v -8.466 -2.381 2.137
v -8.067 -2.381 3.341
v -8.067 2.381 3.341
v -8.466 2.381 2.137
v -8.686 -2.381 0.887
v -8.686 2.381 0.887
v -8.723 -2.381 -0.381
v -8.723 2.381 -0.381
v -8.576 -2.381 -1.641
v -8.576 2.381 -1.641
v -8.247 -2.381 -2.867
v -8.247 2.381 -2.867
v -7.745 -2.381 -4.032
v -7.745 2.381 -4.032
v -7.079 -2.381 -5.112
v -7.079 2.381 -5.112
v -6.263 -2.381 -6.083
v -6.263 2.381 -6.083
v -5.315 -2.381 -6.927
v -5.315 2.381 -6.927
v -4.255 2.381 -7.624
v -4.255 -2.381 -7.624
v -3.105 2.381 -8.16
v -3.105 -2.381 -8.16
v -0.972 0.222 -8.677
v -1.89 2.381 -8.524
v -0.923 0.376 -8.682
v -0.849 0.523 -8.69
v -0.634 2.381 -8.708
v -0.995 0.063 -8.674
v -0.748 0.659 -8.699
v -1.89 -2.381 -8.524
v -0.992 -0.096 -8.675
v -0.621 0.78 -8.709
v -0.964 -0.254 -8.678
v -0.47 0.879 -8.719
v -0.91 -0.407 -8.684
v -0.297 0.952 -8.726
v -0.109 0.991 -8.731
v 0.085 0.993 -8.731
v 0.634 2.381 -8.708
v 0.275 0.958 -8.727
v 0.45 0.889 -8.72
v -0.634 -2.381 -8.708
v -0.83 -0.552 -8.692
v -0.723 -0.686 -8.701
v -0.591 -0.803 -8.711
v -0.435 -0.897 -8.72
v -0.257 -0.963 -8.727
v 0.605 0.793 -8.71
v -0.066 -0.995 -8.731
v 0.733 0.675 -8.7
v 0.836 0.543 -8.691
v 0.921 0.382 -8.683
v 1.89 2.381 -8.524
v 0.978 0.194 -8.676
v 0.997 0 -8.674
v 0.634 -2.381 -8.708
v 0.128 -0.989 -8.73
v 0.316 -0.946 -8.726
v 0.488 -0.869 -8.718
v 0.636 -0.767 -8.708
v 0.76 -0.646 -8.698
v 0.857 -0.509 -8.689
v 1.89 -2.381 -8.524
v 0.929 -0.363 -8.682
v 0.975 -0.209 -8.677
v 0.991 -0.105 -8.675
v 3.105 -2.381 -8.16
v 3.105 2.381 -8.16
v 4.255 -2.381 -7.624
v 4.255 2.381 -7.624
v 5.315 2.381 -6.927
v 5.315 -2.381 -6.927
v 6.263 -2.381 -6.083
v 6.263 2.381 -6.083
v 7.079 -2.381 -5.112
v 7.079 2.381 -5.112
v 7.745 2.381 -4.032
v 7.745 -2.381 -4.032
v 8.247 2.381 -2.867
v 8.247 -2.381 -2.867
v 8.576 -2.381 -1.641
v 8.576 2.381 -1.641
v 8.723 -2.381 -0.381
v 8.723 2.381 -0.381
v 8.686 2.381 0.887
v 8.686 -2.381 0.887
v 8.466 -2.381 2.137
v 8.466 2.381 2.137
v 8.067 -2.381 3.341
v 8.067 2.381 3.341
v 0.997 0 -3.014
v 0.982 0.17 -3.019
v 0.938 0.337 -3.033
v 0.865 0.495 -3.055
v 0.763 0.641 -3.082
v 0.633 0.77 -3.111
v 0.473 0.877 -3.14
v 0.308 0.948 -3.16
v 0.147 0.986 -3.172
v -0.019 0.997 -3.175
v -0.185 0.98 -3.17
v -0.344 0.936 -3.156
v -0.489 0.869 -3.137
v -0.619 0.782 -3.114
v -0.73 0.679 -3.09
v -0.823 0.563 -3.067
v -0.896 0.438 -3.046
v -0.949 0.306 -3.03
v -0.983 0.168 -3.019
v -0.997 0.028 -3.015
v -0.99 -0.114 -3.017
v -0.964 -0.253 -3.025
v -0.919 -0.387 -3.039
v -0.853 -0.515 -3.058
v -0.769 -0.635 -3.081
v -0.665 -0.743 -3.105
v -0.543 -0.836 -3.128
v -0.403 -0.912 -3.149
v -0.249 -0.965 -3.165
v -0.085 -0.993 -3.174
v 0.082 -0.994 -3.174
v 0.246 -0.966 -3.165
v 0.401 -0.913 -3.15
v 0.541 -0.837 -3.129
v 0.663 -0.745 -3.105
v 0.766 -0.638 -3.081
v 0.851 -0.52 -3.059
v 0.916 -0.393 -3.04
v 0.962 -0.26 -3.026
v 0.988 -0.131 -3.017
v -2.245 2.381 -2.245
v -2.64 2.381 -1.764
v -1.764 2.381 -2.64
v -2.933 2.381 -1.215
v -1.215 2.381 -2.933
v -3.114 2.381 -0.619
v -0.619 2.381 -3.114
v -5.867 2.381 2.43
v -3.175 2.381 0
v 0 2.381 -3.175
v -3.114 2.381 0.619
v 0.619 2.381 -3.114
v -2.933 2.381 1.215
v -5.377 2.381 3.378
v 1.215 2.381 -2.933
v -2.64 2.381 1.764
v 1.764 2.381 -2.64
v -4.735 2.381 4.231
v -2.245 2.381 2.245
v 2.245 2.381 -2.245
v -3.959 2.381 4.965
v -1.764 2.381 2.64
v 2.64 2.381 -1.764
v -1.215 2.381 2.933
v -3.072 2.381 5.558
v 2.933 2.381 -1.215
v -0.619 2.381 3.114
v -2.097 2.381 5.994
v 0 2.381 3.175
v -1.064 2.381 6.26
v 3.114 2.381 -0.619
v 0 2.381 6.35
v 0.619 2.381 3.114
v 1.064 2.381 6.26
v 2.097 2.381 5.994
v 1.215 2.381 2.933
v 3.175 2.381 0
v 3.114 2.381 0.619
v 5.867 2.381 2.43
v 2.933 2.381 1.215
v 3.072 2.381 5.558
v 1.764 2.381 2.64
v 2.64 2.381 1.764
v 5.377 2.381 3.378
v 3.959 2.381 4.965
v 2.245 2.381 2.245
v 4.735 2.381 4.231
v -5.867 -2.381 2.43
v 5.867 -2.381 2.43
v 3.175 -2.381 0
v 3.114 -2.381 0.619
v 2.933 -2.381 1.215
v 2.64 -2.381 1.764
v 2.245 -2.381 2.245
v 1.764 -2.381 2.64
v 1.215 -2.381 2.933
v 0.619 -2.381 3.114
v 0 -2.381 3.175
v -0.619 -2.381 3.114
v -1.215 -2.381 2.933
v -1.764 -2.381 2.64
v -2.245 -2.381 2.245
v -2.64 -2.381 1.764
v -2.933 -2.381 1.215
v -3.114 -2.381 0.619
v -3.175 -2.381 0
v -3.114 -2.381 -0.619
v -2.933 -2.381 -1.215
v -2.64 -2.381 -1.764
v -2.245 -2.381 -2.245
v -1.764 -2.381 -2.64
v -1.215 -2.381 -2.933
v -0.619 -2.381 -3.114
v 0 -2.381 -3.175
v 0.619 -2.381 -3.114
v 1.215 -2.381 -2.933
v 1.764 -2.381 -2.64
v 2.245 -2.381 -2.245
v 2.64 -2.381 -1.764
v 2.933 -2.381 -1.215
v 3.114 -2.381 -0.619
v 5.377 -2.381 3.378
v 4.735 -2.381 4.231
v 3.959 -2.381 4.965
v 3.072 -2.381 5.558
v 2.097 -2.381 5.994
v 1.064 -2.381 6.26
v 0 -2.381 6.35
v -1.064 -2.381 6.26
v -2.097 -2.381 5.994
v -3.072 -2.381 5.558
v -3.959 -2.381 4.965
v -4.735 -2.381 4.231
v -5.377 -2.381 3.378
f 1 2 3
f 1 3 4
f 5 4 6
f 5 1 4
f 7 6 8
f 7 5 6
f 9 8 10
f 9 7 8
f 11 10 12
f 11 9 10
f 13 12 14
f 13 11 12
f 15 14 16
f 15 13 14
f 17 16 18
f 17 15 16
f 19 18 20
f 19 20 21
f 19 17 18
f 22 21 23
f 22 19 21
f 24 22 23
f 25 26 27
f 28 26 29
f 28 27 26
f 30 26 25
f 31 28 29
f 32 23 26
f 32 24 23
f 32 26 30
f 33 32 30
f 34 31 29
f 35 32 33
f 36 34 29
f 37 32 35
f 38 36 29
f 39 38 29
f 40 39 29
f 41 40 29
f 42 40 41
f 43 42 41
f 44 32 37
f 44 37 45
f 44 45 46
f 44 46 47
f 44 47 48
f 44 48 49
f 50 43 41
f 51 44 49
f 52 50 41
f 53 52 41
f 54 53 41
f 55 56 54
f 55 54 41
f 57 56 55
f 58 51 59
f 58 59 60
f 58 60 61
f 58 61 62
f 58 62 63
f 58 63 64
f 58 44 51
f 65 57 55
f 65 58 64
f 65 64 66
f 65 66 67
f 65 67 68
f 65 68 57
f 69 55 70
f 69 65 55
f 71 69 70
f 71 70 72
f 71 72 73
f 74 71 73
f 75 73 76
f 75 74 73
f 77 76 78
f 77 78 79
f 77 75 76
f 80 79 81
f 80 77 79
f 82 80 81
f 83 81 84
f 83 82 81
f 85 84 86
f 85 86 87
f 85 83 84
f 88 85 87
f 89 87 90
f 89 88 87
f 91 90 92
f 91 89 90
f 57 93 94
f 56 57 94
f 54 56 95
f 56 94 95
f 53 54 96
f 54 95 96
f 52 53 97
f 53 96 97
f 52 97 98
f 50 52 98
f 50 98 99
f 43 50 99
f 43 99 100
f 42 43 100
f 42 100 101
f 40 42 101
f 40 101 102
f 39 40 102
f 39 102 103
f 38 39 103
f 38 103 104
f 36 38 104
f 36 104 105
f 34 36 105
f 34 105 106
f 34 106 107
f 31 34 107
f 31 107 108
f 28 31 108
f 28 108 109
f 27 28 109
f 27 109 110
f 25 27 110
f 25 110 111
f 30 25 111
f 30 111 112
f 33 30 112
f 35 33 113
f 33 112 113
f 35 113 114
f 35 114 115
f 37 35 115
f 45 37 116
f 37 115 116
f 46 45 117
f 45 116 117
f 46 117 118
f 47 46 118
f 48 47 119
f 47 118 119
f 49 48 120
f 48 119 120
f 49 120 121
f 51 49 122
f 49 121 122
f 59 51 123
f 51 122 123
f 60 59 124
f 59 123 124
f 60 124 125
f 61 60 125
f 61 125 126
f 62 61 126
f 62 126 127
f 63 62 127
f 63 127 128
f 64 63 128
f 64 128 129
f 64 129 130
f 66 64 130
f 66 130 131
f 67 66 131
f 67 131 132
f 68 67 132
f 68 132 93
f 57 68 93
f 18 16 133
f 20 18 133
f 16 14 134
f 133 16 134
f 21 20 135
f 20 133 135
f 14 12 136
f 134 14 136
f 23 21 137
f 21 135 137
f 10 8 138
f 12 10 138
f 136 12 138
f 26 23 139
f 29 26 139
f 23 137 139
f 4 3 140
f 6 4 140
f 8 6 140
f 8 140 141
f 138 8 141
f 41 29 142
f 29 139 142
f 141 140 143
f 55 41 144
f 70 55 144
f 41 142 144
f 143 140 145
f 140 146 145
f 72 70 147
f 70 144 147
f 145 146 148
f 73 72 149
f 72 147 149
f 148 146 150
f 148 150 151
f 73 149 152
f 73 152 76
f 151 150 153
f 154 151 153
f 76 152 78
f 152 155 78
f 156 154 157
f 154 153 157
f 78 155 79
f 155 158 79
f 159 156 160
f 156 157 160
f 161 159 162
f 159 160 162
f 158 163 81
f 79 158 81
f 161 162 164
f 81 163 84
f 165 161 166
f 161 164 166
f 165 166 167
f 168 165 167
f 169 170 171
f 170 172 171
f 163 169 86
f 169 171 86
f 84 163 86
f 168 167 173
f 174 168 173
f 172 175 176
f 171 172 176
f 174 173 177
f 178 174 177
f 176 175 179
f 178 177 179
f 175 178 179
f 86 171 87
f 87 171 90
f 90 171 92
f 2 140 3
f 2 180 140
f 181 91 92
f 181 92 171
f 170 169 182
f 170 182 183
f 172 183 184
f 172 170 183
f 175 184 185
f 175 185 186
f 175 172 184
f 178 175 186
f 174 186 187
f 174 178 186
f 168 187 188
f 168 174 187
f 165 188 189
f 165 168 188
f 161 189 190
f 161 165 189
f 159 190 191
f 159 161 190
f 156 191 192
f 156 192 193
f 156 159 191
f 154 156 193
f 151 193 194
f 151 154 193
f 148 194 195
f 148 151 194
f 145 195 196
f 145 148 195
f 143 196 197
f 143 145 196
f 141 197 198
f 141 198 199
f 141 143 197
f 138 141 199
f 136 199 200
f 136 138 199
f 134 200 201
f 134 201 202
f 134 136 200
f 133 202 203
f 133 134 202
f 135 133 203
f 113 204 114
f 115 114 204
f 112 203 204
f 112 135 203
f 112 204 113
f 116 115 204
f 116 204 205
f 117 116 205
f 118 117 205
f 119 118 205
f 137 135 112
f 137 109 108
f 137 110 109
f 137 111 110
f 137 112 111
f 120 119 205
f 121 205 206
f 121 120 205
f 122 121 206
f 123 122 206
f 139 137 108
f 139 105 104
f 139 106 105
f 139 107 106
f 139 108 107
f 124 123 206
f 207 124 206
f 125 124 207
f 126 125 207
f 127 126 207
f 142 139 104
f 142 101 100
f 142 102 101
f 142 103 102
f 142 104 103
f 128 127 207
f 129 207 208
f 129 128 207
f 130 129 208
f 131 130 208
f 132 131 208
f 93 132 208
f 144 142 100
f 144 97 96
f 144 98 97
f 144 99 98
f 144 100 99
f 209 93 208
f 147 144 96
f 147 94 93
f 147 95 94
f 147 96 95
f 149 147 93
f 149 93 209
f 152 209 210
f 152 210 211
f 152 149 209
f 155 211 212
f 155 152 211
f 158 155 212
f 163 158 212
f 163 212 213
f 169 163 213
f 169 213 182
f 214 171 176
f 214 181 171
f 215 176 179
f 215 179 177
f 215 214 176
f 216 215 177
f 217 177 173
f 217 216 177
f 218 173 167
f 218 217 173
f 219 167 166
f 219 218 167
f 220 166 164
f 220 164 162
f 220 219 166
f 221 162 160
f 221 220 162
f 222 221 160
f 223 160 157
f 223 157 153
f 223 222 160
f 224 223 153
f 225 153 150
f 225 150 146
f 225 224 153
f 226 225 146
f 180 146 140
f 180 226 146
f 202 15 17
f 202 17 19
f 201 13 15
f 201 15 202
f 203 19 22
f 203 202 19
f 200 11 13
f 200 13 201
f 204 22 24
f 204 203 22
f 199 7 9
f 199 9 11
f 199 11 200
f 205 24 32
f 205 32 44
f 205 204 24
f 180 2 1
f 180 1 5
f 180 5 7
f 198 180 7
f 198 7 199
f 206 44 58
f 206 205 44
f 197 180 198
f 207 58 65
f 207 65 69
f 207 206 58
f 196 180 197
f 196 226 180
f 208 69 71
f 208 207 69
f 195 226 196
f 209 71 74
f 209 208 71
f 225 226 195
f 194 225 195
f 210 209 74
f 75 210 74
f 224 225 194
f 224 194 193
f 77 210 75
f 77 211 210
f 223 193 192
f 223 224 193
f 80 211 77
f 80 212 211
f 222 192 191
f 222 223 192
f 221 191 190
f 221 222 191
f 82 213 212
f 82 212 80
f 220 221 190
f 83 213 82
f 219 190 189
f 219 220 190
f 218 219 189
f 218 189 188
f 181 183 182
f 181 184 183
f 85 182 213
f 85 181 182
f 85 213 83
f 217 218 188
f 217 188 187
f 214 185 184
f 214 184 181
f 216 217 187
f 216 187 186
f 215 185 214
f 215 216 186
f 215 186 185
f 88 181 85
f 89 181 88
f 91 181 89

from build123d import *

# Parameters (mm, degrees)
F0_R     = 3.175
F1_DEPTH = 2.38125
F3_D     = 1.9939
F3_DEPTH = 8.73225


with BuildPart() as f1:
    # F0 (on Front) → F1 (new body, symmetric)
    with BuildSketch(Plane.XZ):
        with BuildLine():
            Line((-5.8666350314, 2.4300397955), (-8.0666231682, 3.3413047188))
            ThreePointArc((-8.0666231682, 3.3413047188), (0, -8.73125), (8.0666231682, 3.3413047188))
            Line((8.0666231682, 3.3413047188), (5.8666350314, 2.4300397955))
            ThreePointArc((5.8666350314, 2.4300397955), (0, 6.35), (-5.8666350314, 2.4300397955))
        make_face()
        Circle(F0_R, mode=Mode.SUBTRACT)
    extrude(amount=F1_DEPTH, both=True)

    # F3 (through all, one way)
    with BuildSketch(Plane.XY):
        with Locations((0, 0)):
            Circle(F3_D / 2)
    extrude(amount=-F3_DEPTH, mode=Mode.SUBTRACT)


solid = f1.part
